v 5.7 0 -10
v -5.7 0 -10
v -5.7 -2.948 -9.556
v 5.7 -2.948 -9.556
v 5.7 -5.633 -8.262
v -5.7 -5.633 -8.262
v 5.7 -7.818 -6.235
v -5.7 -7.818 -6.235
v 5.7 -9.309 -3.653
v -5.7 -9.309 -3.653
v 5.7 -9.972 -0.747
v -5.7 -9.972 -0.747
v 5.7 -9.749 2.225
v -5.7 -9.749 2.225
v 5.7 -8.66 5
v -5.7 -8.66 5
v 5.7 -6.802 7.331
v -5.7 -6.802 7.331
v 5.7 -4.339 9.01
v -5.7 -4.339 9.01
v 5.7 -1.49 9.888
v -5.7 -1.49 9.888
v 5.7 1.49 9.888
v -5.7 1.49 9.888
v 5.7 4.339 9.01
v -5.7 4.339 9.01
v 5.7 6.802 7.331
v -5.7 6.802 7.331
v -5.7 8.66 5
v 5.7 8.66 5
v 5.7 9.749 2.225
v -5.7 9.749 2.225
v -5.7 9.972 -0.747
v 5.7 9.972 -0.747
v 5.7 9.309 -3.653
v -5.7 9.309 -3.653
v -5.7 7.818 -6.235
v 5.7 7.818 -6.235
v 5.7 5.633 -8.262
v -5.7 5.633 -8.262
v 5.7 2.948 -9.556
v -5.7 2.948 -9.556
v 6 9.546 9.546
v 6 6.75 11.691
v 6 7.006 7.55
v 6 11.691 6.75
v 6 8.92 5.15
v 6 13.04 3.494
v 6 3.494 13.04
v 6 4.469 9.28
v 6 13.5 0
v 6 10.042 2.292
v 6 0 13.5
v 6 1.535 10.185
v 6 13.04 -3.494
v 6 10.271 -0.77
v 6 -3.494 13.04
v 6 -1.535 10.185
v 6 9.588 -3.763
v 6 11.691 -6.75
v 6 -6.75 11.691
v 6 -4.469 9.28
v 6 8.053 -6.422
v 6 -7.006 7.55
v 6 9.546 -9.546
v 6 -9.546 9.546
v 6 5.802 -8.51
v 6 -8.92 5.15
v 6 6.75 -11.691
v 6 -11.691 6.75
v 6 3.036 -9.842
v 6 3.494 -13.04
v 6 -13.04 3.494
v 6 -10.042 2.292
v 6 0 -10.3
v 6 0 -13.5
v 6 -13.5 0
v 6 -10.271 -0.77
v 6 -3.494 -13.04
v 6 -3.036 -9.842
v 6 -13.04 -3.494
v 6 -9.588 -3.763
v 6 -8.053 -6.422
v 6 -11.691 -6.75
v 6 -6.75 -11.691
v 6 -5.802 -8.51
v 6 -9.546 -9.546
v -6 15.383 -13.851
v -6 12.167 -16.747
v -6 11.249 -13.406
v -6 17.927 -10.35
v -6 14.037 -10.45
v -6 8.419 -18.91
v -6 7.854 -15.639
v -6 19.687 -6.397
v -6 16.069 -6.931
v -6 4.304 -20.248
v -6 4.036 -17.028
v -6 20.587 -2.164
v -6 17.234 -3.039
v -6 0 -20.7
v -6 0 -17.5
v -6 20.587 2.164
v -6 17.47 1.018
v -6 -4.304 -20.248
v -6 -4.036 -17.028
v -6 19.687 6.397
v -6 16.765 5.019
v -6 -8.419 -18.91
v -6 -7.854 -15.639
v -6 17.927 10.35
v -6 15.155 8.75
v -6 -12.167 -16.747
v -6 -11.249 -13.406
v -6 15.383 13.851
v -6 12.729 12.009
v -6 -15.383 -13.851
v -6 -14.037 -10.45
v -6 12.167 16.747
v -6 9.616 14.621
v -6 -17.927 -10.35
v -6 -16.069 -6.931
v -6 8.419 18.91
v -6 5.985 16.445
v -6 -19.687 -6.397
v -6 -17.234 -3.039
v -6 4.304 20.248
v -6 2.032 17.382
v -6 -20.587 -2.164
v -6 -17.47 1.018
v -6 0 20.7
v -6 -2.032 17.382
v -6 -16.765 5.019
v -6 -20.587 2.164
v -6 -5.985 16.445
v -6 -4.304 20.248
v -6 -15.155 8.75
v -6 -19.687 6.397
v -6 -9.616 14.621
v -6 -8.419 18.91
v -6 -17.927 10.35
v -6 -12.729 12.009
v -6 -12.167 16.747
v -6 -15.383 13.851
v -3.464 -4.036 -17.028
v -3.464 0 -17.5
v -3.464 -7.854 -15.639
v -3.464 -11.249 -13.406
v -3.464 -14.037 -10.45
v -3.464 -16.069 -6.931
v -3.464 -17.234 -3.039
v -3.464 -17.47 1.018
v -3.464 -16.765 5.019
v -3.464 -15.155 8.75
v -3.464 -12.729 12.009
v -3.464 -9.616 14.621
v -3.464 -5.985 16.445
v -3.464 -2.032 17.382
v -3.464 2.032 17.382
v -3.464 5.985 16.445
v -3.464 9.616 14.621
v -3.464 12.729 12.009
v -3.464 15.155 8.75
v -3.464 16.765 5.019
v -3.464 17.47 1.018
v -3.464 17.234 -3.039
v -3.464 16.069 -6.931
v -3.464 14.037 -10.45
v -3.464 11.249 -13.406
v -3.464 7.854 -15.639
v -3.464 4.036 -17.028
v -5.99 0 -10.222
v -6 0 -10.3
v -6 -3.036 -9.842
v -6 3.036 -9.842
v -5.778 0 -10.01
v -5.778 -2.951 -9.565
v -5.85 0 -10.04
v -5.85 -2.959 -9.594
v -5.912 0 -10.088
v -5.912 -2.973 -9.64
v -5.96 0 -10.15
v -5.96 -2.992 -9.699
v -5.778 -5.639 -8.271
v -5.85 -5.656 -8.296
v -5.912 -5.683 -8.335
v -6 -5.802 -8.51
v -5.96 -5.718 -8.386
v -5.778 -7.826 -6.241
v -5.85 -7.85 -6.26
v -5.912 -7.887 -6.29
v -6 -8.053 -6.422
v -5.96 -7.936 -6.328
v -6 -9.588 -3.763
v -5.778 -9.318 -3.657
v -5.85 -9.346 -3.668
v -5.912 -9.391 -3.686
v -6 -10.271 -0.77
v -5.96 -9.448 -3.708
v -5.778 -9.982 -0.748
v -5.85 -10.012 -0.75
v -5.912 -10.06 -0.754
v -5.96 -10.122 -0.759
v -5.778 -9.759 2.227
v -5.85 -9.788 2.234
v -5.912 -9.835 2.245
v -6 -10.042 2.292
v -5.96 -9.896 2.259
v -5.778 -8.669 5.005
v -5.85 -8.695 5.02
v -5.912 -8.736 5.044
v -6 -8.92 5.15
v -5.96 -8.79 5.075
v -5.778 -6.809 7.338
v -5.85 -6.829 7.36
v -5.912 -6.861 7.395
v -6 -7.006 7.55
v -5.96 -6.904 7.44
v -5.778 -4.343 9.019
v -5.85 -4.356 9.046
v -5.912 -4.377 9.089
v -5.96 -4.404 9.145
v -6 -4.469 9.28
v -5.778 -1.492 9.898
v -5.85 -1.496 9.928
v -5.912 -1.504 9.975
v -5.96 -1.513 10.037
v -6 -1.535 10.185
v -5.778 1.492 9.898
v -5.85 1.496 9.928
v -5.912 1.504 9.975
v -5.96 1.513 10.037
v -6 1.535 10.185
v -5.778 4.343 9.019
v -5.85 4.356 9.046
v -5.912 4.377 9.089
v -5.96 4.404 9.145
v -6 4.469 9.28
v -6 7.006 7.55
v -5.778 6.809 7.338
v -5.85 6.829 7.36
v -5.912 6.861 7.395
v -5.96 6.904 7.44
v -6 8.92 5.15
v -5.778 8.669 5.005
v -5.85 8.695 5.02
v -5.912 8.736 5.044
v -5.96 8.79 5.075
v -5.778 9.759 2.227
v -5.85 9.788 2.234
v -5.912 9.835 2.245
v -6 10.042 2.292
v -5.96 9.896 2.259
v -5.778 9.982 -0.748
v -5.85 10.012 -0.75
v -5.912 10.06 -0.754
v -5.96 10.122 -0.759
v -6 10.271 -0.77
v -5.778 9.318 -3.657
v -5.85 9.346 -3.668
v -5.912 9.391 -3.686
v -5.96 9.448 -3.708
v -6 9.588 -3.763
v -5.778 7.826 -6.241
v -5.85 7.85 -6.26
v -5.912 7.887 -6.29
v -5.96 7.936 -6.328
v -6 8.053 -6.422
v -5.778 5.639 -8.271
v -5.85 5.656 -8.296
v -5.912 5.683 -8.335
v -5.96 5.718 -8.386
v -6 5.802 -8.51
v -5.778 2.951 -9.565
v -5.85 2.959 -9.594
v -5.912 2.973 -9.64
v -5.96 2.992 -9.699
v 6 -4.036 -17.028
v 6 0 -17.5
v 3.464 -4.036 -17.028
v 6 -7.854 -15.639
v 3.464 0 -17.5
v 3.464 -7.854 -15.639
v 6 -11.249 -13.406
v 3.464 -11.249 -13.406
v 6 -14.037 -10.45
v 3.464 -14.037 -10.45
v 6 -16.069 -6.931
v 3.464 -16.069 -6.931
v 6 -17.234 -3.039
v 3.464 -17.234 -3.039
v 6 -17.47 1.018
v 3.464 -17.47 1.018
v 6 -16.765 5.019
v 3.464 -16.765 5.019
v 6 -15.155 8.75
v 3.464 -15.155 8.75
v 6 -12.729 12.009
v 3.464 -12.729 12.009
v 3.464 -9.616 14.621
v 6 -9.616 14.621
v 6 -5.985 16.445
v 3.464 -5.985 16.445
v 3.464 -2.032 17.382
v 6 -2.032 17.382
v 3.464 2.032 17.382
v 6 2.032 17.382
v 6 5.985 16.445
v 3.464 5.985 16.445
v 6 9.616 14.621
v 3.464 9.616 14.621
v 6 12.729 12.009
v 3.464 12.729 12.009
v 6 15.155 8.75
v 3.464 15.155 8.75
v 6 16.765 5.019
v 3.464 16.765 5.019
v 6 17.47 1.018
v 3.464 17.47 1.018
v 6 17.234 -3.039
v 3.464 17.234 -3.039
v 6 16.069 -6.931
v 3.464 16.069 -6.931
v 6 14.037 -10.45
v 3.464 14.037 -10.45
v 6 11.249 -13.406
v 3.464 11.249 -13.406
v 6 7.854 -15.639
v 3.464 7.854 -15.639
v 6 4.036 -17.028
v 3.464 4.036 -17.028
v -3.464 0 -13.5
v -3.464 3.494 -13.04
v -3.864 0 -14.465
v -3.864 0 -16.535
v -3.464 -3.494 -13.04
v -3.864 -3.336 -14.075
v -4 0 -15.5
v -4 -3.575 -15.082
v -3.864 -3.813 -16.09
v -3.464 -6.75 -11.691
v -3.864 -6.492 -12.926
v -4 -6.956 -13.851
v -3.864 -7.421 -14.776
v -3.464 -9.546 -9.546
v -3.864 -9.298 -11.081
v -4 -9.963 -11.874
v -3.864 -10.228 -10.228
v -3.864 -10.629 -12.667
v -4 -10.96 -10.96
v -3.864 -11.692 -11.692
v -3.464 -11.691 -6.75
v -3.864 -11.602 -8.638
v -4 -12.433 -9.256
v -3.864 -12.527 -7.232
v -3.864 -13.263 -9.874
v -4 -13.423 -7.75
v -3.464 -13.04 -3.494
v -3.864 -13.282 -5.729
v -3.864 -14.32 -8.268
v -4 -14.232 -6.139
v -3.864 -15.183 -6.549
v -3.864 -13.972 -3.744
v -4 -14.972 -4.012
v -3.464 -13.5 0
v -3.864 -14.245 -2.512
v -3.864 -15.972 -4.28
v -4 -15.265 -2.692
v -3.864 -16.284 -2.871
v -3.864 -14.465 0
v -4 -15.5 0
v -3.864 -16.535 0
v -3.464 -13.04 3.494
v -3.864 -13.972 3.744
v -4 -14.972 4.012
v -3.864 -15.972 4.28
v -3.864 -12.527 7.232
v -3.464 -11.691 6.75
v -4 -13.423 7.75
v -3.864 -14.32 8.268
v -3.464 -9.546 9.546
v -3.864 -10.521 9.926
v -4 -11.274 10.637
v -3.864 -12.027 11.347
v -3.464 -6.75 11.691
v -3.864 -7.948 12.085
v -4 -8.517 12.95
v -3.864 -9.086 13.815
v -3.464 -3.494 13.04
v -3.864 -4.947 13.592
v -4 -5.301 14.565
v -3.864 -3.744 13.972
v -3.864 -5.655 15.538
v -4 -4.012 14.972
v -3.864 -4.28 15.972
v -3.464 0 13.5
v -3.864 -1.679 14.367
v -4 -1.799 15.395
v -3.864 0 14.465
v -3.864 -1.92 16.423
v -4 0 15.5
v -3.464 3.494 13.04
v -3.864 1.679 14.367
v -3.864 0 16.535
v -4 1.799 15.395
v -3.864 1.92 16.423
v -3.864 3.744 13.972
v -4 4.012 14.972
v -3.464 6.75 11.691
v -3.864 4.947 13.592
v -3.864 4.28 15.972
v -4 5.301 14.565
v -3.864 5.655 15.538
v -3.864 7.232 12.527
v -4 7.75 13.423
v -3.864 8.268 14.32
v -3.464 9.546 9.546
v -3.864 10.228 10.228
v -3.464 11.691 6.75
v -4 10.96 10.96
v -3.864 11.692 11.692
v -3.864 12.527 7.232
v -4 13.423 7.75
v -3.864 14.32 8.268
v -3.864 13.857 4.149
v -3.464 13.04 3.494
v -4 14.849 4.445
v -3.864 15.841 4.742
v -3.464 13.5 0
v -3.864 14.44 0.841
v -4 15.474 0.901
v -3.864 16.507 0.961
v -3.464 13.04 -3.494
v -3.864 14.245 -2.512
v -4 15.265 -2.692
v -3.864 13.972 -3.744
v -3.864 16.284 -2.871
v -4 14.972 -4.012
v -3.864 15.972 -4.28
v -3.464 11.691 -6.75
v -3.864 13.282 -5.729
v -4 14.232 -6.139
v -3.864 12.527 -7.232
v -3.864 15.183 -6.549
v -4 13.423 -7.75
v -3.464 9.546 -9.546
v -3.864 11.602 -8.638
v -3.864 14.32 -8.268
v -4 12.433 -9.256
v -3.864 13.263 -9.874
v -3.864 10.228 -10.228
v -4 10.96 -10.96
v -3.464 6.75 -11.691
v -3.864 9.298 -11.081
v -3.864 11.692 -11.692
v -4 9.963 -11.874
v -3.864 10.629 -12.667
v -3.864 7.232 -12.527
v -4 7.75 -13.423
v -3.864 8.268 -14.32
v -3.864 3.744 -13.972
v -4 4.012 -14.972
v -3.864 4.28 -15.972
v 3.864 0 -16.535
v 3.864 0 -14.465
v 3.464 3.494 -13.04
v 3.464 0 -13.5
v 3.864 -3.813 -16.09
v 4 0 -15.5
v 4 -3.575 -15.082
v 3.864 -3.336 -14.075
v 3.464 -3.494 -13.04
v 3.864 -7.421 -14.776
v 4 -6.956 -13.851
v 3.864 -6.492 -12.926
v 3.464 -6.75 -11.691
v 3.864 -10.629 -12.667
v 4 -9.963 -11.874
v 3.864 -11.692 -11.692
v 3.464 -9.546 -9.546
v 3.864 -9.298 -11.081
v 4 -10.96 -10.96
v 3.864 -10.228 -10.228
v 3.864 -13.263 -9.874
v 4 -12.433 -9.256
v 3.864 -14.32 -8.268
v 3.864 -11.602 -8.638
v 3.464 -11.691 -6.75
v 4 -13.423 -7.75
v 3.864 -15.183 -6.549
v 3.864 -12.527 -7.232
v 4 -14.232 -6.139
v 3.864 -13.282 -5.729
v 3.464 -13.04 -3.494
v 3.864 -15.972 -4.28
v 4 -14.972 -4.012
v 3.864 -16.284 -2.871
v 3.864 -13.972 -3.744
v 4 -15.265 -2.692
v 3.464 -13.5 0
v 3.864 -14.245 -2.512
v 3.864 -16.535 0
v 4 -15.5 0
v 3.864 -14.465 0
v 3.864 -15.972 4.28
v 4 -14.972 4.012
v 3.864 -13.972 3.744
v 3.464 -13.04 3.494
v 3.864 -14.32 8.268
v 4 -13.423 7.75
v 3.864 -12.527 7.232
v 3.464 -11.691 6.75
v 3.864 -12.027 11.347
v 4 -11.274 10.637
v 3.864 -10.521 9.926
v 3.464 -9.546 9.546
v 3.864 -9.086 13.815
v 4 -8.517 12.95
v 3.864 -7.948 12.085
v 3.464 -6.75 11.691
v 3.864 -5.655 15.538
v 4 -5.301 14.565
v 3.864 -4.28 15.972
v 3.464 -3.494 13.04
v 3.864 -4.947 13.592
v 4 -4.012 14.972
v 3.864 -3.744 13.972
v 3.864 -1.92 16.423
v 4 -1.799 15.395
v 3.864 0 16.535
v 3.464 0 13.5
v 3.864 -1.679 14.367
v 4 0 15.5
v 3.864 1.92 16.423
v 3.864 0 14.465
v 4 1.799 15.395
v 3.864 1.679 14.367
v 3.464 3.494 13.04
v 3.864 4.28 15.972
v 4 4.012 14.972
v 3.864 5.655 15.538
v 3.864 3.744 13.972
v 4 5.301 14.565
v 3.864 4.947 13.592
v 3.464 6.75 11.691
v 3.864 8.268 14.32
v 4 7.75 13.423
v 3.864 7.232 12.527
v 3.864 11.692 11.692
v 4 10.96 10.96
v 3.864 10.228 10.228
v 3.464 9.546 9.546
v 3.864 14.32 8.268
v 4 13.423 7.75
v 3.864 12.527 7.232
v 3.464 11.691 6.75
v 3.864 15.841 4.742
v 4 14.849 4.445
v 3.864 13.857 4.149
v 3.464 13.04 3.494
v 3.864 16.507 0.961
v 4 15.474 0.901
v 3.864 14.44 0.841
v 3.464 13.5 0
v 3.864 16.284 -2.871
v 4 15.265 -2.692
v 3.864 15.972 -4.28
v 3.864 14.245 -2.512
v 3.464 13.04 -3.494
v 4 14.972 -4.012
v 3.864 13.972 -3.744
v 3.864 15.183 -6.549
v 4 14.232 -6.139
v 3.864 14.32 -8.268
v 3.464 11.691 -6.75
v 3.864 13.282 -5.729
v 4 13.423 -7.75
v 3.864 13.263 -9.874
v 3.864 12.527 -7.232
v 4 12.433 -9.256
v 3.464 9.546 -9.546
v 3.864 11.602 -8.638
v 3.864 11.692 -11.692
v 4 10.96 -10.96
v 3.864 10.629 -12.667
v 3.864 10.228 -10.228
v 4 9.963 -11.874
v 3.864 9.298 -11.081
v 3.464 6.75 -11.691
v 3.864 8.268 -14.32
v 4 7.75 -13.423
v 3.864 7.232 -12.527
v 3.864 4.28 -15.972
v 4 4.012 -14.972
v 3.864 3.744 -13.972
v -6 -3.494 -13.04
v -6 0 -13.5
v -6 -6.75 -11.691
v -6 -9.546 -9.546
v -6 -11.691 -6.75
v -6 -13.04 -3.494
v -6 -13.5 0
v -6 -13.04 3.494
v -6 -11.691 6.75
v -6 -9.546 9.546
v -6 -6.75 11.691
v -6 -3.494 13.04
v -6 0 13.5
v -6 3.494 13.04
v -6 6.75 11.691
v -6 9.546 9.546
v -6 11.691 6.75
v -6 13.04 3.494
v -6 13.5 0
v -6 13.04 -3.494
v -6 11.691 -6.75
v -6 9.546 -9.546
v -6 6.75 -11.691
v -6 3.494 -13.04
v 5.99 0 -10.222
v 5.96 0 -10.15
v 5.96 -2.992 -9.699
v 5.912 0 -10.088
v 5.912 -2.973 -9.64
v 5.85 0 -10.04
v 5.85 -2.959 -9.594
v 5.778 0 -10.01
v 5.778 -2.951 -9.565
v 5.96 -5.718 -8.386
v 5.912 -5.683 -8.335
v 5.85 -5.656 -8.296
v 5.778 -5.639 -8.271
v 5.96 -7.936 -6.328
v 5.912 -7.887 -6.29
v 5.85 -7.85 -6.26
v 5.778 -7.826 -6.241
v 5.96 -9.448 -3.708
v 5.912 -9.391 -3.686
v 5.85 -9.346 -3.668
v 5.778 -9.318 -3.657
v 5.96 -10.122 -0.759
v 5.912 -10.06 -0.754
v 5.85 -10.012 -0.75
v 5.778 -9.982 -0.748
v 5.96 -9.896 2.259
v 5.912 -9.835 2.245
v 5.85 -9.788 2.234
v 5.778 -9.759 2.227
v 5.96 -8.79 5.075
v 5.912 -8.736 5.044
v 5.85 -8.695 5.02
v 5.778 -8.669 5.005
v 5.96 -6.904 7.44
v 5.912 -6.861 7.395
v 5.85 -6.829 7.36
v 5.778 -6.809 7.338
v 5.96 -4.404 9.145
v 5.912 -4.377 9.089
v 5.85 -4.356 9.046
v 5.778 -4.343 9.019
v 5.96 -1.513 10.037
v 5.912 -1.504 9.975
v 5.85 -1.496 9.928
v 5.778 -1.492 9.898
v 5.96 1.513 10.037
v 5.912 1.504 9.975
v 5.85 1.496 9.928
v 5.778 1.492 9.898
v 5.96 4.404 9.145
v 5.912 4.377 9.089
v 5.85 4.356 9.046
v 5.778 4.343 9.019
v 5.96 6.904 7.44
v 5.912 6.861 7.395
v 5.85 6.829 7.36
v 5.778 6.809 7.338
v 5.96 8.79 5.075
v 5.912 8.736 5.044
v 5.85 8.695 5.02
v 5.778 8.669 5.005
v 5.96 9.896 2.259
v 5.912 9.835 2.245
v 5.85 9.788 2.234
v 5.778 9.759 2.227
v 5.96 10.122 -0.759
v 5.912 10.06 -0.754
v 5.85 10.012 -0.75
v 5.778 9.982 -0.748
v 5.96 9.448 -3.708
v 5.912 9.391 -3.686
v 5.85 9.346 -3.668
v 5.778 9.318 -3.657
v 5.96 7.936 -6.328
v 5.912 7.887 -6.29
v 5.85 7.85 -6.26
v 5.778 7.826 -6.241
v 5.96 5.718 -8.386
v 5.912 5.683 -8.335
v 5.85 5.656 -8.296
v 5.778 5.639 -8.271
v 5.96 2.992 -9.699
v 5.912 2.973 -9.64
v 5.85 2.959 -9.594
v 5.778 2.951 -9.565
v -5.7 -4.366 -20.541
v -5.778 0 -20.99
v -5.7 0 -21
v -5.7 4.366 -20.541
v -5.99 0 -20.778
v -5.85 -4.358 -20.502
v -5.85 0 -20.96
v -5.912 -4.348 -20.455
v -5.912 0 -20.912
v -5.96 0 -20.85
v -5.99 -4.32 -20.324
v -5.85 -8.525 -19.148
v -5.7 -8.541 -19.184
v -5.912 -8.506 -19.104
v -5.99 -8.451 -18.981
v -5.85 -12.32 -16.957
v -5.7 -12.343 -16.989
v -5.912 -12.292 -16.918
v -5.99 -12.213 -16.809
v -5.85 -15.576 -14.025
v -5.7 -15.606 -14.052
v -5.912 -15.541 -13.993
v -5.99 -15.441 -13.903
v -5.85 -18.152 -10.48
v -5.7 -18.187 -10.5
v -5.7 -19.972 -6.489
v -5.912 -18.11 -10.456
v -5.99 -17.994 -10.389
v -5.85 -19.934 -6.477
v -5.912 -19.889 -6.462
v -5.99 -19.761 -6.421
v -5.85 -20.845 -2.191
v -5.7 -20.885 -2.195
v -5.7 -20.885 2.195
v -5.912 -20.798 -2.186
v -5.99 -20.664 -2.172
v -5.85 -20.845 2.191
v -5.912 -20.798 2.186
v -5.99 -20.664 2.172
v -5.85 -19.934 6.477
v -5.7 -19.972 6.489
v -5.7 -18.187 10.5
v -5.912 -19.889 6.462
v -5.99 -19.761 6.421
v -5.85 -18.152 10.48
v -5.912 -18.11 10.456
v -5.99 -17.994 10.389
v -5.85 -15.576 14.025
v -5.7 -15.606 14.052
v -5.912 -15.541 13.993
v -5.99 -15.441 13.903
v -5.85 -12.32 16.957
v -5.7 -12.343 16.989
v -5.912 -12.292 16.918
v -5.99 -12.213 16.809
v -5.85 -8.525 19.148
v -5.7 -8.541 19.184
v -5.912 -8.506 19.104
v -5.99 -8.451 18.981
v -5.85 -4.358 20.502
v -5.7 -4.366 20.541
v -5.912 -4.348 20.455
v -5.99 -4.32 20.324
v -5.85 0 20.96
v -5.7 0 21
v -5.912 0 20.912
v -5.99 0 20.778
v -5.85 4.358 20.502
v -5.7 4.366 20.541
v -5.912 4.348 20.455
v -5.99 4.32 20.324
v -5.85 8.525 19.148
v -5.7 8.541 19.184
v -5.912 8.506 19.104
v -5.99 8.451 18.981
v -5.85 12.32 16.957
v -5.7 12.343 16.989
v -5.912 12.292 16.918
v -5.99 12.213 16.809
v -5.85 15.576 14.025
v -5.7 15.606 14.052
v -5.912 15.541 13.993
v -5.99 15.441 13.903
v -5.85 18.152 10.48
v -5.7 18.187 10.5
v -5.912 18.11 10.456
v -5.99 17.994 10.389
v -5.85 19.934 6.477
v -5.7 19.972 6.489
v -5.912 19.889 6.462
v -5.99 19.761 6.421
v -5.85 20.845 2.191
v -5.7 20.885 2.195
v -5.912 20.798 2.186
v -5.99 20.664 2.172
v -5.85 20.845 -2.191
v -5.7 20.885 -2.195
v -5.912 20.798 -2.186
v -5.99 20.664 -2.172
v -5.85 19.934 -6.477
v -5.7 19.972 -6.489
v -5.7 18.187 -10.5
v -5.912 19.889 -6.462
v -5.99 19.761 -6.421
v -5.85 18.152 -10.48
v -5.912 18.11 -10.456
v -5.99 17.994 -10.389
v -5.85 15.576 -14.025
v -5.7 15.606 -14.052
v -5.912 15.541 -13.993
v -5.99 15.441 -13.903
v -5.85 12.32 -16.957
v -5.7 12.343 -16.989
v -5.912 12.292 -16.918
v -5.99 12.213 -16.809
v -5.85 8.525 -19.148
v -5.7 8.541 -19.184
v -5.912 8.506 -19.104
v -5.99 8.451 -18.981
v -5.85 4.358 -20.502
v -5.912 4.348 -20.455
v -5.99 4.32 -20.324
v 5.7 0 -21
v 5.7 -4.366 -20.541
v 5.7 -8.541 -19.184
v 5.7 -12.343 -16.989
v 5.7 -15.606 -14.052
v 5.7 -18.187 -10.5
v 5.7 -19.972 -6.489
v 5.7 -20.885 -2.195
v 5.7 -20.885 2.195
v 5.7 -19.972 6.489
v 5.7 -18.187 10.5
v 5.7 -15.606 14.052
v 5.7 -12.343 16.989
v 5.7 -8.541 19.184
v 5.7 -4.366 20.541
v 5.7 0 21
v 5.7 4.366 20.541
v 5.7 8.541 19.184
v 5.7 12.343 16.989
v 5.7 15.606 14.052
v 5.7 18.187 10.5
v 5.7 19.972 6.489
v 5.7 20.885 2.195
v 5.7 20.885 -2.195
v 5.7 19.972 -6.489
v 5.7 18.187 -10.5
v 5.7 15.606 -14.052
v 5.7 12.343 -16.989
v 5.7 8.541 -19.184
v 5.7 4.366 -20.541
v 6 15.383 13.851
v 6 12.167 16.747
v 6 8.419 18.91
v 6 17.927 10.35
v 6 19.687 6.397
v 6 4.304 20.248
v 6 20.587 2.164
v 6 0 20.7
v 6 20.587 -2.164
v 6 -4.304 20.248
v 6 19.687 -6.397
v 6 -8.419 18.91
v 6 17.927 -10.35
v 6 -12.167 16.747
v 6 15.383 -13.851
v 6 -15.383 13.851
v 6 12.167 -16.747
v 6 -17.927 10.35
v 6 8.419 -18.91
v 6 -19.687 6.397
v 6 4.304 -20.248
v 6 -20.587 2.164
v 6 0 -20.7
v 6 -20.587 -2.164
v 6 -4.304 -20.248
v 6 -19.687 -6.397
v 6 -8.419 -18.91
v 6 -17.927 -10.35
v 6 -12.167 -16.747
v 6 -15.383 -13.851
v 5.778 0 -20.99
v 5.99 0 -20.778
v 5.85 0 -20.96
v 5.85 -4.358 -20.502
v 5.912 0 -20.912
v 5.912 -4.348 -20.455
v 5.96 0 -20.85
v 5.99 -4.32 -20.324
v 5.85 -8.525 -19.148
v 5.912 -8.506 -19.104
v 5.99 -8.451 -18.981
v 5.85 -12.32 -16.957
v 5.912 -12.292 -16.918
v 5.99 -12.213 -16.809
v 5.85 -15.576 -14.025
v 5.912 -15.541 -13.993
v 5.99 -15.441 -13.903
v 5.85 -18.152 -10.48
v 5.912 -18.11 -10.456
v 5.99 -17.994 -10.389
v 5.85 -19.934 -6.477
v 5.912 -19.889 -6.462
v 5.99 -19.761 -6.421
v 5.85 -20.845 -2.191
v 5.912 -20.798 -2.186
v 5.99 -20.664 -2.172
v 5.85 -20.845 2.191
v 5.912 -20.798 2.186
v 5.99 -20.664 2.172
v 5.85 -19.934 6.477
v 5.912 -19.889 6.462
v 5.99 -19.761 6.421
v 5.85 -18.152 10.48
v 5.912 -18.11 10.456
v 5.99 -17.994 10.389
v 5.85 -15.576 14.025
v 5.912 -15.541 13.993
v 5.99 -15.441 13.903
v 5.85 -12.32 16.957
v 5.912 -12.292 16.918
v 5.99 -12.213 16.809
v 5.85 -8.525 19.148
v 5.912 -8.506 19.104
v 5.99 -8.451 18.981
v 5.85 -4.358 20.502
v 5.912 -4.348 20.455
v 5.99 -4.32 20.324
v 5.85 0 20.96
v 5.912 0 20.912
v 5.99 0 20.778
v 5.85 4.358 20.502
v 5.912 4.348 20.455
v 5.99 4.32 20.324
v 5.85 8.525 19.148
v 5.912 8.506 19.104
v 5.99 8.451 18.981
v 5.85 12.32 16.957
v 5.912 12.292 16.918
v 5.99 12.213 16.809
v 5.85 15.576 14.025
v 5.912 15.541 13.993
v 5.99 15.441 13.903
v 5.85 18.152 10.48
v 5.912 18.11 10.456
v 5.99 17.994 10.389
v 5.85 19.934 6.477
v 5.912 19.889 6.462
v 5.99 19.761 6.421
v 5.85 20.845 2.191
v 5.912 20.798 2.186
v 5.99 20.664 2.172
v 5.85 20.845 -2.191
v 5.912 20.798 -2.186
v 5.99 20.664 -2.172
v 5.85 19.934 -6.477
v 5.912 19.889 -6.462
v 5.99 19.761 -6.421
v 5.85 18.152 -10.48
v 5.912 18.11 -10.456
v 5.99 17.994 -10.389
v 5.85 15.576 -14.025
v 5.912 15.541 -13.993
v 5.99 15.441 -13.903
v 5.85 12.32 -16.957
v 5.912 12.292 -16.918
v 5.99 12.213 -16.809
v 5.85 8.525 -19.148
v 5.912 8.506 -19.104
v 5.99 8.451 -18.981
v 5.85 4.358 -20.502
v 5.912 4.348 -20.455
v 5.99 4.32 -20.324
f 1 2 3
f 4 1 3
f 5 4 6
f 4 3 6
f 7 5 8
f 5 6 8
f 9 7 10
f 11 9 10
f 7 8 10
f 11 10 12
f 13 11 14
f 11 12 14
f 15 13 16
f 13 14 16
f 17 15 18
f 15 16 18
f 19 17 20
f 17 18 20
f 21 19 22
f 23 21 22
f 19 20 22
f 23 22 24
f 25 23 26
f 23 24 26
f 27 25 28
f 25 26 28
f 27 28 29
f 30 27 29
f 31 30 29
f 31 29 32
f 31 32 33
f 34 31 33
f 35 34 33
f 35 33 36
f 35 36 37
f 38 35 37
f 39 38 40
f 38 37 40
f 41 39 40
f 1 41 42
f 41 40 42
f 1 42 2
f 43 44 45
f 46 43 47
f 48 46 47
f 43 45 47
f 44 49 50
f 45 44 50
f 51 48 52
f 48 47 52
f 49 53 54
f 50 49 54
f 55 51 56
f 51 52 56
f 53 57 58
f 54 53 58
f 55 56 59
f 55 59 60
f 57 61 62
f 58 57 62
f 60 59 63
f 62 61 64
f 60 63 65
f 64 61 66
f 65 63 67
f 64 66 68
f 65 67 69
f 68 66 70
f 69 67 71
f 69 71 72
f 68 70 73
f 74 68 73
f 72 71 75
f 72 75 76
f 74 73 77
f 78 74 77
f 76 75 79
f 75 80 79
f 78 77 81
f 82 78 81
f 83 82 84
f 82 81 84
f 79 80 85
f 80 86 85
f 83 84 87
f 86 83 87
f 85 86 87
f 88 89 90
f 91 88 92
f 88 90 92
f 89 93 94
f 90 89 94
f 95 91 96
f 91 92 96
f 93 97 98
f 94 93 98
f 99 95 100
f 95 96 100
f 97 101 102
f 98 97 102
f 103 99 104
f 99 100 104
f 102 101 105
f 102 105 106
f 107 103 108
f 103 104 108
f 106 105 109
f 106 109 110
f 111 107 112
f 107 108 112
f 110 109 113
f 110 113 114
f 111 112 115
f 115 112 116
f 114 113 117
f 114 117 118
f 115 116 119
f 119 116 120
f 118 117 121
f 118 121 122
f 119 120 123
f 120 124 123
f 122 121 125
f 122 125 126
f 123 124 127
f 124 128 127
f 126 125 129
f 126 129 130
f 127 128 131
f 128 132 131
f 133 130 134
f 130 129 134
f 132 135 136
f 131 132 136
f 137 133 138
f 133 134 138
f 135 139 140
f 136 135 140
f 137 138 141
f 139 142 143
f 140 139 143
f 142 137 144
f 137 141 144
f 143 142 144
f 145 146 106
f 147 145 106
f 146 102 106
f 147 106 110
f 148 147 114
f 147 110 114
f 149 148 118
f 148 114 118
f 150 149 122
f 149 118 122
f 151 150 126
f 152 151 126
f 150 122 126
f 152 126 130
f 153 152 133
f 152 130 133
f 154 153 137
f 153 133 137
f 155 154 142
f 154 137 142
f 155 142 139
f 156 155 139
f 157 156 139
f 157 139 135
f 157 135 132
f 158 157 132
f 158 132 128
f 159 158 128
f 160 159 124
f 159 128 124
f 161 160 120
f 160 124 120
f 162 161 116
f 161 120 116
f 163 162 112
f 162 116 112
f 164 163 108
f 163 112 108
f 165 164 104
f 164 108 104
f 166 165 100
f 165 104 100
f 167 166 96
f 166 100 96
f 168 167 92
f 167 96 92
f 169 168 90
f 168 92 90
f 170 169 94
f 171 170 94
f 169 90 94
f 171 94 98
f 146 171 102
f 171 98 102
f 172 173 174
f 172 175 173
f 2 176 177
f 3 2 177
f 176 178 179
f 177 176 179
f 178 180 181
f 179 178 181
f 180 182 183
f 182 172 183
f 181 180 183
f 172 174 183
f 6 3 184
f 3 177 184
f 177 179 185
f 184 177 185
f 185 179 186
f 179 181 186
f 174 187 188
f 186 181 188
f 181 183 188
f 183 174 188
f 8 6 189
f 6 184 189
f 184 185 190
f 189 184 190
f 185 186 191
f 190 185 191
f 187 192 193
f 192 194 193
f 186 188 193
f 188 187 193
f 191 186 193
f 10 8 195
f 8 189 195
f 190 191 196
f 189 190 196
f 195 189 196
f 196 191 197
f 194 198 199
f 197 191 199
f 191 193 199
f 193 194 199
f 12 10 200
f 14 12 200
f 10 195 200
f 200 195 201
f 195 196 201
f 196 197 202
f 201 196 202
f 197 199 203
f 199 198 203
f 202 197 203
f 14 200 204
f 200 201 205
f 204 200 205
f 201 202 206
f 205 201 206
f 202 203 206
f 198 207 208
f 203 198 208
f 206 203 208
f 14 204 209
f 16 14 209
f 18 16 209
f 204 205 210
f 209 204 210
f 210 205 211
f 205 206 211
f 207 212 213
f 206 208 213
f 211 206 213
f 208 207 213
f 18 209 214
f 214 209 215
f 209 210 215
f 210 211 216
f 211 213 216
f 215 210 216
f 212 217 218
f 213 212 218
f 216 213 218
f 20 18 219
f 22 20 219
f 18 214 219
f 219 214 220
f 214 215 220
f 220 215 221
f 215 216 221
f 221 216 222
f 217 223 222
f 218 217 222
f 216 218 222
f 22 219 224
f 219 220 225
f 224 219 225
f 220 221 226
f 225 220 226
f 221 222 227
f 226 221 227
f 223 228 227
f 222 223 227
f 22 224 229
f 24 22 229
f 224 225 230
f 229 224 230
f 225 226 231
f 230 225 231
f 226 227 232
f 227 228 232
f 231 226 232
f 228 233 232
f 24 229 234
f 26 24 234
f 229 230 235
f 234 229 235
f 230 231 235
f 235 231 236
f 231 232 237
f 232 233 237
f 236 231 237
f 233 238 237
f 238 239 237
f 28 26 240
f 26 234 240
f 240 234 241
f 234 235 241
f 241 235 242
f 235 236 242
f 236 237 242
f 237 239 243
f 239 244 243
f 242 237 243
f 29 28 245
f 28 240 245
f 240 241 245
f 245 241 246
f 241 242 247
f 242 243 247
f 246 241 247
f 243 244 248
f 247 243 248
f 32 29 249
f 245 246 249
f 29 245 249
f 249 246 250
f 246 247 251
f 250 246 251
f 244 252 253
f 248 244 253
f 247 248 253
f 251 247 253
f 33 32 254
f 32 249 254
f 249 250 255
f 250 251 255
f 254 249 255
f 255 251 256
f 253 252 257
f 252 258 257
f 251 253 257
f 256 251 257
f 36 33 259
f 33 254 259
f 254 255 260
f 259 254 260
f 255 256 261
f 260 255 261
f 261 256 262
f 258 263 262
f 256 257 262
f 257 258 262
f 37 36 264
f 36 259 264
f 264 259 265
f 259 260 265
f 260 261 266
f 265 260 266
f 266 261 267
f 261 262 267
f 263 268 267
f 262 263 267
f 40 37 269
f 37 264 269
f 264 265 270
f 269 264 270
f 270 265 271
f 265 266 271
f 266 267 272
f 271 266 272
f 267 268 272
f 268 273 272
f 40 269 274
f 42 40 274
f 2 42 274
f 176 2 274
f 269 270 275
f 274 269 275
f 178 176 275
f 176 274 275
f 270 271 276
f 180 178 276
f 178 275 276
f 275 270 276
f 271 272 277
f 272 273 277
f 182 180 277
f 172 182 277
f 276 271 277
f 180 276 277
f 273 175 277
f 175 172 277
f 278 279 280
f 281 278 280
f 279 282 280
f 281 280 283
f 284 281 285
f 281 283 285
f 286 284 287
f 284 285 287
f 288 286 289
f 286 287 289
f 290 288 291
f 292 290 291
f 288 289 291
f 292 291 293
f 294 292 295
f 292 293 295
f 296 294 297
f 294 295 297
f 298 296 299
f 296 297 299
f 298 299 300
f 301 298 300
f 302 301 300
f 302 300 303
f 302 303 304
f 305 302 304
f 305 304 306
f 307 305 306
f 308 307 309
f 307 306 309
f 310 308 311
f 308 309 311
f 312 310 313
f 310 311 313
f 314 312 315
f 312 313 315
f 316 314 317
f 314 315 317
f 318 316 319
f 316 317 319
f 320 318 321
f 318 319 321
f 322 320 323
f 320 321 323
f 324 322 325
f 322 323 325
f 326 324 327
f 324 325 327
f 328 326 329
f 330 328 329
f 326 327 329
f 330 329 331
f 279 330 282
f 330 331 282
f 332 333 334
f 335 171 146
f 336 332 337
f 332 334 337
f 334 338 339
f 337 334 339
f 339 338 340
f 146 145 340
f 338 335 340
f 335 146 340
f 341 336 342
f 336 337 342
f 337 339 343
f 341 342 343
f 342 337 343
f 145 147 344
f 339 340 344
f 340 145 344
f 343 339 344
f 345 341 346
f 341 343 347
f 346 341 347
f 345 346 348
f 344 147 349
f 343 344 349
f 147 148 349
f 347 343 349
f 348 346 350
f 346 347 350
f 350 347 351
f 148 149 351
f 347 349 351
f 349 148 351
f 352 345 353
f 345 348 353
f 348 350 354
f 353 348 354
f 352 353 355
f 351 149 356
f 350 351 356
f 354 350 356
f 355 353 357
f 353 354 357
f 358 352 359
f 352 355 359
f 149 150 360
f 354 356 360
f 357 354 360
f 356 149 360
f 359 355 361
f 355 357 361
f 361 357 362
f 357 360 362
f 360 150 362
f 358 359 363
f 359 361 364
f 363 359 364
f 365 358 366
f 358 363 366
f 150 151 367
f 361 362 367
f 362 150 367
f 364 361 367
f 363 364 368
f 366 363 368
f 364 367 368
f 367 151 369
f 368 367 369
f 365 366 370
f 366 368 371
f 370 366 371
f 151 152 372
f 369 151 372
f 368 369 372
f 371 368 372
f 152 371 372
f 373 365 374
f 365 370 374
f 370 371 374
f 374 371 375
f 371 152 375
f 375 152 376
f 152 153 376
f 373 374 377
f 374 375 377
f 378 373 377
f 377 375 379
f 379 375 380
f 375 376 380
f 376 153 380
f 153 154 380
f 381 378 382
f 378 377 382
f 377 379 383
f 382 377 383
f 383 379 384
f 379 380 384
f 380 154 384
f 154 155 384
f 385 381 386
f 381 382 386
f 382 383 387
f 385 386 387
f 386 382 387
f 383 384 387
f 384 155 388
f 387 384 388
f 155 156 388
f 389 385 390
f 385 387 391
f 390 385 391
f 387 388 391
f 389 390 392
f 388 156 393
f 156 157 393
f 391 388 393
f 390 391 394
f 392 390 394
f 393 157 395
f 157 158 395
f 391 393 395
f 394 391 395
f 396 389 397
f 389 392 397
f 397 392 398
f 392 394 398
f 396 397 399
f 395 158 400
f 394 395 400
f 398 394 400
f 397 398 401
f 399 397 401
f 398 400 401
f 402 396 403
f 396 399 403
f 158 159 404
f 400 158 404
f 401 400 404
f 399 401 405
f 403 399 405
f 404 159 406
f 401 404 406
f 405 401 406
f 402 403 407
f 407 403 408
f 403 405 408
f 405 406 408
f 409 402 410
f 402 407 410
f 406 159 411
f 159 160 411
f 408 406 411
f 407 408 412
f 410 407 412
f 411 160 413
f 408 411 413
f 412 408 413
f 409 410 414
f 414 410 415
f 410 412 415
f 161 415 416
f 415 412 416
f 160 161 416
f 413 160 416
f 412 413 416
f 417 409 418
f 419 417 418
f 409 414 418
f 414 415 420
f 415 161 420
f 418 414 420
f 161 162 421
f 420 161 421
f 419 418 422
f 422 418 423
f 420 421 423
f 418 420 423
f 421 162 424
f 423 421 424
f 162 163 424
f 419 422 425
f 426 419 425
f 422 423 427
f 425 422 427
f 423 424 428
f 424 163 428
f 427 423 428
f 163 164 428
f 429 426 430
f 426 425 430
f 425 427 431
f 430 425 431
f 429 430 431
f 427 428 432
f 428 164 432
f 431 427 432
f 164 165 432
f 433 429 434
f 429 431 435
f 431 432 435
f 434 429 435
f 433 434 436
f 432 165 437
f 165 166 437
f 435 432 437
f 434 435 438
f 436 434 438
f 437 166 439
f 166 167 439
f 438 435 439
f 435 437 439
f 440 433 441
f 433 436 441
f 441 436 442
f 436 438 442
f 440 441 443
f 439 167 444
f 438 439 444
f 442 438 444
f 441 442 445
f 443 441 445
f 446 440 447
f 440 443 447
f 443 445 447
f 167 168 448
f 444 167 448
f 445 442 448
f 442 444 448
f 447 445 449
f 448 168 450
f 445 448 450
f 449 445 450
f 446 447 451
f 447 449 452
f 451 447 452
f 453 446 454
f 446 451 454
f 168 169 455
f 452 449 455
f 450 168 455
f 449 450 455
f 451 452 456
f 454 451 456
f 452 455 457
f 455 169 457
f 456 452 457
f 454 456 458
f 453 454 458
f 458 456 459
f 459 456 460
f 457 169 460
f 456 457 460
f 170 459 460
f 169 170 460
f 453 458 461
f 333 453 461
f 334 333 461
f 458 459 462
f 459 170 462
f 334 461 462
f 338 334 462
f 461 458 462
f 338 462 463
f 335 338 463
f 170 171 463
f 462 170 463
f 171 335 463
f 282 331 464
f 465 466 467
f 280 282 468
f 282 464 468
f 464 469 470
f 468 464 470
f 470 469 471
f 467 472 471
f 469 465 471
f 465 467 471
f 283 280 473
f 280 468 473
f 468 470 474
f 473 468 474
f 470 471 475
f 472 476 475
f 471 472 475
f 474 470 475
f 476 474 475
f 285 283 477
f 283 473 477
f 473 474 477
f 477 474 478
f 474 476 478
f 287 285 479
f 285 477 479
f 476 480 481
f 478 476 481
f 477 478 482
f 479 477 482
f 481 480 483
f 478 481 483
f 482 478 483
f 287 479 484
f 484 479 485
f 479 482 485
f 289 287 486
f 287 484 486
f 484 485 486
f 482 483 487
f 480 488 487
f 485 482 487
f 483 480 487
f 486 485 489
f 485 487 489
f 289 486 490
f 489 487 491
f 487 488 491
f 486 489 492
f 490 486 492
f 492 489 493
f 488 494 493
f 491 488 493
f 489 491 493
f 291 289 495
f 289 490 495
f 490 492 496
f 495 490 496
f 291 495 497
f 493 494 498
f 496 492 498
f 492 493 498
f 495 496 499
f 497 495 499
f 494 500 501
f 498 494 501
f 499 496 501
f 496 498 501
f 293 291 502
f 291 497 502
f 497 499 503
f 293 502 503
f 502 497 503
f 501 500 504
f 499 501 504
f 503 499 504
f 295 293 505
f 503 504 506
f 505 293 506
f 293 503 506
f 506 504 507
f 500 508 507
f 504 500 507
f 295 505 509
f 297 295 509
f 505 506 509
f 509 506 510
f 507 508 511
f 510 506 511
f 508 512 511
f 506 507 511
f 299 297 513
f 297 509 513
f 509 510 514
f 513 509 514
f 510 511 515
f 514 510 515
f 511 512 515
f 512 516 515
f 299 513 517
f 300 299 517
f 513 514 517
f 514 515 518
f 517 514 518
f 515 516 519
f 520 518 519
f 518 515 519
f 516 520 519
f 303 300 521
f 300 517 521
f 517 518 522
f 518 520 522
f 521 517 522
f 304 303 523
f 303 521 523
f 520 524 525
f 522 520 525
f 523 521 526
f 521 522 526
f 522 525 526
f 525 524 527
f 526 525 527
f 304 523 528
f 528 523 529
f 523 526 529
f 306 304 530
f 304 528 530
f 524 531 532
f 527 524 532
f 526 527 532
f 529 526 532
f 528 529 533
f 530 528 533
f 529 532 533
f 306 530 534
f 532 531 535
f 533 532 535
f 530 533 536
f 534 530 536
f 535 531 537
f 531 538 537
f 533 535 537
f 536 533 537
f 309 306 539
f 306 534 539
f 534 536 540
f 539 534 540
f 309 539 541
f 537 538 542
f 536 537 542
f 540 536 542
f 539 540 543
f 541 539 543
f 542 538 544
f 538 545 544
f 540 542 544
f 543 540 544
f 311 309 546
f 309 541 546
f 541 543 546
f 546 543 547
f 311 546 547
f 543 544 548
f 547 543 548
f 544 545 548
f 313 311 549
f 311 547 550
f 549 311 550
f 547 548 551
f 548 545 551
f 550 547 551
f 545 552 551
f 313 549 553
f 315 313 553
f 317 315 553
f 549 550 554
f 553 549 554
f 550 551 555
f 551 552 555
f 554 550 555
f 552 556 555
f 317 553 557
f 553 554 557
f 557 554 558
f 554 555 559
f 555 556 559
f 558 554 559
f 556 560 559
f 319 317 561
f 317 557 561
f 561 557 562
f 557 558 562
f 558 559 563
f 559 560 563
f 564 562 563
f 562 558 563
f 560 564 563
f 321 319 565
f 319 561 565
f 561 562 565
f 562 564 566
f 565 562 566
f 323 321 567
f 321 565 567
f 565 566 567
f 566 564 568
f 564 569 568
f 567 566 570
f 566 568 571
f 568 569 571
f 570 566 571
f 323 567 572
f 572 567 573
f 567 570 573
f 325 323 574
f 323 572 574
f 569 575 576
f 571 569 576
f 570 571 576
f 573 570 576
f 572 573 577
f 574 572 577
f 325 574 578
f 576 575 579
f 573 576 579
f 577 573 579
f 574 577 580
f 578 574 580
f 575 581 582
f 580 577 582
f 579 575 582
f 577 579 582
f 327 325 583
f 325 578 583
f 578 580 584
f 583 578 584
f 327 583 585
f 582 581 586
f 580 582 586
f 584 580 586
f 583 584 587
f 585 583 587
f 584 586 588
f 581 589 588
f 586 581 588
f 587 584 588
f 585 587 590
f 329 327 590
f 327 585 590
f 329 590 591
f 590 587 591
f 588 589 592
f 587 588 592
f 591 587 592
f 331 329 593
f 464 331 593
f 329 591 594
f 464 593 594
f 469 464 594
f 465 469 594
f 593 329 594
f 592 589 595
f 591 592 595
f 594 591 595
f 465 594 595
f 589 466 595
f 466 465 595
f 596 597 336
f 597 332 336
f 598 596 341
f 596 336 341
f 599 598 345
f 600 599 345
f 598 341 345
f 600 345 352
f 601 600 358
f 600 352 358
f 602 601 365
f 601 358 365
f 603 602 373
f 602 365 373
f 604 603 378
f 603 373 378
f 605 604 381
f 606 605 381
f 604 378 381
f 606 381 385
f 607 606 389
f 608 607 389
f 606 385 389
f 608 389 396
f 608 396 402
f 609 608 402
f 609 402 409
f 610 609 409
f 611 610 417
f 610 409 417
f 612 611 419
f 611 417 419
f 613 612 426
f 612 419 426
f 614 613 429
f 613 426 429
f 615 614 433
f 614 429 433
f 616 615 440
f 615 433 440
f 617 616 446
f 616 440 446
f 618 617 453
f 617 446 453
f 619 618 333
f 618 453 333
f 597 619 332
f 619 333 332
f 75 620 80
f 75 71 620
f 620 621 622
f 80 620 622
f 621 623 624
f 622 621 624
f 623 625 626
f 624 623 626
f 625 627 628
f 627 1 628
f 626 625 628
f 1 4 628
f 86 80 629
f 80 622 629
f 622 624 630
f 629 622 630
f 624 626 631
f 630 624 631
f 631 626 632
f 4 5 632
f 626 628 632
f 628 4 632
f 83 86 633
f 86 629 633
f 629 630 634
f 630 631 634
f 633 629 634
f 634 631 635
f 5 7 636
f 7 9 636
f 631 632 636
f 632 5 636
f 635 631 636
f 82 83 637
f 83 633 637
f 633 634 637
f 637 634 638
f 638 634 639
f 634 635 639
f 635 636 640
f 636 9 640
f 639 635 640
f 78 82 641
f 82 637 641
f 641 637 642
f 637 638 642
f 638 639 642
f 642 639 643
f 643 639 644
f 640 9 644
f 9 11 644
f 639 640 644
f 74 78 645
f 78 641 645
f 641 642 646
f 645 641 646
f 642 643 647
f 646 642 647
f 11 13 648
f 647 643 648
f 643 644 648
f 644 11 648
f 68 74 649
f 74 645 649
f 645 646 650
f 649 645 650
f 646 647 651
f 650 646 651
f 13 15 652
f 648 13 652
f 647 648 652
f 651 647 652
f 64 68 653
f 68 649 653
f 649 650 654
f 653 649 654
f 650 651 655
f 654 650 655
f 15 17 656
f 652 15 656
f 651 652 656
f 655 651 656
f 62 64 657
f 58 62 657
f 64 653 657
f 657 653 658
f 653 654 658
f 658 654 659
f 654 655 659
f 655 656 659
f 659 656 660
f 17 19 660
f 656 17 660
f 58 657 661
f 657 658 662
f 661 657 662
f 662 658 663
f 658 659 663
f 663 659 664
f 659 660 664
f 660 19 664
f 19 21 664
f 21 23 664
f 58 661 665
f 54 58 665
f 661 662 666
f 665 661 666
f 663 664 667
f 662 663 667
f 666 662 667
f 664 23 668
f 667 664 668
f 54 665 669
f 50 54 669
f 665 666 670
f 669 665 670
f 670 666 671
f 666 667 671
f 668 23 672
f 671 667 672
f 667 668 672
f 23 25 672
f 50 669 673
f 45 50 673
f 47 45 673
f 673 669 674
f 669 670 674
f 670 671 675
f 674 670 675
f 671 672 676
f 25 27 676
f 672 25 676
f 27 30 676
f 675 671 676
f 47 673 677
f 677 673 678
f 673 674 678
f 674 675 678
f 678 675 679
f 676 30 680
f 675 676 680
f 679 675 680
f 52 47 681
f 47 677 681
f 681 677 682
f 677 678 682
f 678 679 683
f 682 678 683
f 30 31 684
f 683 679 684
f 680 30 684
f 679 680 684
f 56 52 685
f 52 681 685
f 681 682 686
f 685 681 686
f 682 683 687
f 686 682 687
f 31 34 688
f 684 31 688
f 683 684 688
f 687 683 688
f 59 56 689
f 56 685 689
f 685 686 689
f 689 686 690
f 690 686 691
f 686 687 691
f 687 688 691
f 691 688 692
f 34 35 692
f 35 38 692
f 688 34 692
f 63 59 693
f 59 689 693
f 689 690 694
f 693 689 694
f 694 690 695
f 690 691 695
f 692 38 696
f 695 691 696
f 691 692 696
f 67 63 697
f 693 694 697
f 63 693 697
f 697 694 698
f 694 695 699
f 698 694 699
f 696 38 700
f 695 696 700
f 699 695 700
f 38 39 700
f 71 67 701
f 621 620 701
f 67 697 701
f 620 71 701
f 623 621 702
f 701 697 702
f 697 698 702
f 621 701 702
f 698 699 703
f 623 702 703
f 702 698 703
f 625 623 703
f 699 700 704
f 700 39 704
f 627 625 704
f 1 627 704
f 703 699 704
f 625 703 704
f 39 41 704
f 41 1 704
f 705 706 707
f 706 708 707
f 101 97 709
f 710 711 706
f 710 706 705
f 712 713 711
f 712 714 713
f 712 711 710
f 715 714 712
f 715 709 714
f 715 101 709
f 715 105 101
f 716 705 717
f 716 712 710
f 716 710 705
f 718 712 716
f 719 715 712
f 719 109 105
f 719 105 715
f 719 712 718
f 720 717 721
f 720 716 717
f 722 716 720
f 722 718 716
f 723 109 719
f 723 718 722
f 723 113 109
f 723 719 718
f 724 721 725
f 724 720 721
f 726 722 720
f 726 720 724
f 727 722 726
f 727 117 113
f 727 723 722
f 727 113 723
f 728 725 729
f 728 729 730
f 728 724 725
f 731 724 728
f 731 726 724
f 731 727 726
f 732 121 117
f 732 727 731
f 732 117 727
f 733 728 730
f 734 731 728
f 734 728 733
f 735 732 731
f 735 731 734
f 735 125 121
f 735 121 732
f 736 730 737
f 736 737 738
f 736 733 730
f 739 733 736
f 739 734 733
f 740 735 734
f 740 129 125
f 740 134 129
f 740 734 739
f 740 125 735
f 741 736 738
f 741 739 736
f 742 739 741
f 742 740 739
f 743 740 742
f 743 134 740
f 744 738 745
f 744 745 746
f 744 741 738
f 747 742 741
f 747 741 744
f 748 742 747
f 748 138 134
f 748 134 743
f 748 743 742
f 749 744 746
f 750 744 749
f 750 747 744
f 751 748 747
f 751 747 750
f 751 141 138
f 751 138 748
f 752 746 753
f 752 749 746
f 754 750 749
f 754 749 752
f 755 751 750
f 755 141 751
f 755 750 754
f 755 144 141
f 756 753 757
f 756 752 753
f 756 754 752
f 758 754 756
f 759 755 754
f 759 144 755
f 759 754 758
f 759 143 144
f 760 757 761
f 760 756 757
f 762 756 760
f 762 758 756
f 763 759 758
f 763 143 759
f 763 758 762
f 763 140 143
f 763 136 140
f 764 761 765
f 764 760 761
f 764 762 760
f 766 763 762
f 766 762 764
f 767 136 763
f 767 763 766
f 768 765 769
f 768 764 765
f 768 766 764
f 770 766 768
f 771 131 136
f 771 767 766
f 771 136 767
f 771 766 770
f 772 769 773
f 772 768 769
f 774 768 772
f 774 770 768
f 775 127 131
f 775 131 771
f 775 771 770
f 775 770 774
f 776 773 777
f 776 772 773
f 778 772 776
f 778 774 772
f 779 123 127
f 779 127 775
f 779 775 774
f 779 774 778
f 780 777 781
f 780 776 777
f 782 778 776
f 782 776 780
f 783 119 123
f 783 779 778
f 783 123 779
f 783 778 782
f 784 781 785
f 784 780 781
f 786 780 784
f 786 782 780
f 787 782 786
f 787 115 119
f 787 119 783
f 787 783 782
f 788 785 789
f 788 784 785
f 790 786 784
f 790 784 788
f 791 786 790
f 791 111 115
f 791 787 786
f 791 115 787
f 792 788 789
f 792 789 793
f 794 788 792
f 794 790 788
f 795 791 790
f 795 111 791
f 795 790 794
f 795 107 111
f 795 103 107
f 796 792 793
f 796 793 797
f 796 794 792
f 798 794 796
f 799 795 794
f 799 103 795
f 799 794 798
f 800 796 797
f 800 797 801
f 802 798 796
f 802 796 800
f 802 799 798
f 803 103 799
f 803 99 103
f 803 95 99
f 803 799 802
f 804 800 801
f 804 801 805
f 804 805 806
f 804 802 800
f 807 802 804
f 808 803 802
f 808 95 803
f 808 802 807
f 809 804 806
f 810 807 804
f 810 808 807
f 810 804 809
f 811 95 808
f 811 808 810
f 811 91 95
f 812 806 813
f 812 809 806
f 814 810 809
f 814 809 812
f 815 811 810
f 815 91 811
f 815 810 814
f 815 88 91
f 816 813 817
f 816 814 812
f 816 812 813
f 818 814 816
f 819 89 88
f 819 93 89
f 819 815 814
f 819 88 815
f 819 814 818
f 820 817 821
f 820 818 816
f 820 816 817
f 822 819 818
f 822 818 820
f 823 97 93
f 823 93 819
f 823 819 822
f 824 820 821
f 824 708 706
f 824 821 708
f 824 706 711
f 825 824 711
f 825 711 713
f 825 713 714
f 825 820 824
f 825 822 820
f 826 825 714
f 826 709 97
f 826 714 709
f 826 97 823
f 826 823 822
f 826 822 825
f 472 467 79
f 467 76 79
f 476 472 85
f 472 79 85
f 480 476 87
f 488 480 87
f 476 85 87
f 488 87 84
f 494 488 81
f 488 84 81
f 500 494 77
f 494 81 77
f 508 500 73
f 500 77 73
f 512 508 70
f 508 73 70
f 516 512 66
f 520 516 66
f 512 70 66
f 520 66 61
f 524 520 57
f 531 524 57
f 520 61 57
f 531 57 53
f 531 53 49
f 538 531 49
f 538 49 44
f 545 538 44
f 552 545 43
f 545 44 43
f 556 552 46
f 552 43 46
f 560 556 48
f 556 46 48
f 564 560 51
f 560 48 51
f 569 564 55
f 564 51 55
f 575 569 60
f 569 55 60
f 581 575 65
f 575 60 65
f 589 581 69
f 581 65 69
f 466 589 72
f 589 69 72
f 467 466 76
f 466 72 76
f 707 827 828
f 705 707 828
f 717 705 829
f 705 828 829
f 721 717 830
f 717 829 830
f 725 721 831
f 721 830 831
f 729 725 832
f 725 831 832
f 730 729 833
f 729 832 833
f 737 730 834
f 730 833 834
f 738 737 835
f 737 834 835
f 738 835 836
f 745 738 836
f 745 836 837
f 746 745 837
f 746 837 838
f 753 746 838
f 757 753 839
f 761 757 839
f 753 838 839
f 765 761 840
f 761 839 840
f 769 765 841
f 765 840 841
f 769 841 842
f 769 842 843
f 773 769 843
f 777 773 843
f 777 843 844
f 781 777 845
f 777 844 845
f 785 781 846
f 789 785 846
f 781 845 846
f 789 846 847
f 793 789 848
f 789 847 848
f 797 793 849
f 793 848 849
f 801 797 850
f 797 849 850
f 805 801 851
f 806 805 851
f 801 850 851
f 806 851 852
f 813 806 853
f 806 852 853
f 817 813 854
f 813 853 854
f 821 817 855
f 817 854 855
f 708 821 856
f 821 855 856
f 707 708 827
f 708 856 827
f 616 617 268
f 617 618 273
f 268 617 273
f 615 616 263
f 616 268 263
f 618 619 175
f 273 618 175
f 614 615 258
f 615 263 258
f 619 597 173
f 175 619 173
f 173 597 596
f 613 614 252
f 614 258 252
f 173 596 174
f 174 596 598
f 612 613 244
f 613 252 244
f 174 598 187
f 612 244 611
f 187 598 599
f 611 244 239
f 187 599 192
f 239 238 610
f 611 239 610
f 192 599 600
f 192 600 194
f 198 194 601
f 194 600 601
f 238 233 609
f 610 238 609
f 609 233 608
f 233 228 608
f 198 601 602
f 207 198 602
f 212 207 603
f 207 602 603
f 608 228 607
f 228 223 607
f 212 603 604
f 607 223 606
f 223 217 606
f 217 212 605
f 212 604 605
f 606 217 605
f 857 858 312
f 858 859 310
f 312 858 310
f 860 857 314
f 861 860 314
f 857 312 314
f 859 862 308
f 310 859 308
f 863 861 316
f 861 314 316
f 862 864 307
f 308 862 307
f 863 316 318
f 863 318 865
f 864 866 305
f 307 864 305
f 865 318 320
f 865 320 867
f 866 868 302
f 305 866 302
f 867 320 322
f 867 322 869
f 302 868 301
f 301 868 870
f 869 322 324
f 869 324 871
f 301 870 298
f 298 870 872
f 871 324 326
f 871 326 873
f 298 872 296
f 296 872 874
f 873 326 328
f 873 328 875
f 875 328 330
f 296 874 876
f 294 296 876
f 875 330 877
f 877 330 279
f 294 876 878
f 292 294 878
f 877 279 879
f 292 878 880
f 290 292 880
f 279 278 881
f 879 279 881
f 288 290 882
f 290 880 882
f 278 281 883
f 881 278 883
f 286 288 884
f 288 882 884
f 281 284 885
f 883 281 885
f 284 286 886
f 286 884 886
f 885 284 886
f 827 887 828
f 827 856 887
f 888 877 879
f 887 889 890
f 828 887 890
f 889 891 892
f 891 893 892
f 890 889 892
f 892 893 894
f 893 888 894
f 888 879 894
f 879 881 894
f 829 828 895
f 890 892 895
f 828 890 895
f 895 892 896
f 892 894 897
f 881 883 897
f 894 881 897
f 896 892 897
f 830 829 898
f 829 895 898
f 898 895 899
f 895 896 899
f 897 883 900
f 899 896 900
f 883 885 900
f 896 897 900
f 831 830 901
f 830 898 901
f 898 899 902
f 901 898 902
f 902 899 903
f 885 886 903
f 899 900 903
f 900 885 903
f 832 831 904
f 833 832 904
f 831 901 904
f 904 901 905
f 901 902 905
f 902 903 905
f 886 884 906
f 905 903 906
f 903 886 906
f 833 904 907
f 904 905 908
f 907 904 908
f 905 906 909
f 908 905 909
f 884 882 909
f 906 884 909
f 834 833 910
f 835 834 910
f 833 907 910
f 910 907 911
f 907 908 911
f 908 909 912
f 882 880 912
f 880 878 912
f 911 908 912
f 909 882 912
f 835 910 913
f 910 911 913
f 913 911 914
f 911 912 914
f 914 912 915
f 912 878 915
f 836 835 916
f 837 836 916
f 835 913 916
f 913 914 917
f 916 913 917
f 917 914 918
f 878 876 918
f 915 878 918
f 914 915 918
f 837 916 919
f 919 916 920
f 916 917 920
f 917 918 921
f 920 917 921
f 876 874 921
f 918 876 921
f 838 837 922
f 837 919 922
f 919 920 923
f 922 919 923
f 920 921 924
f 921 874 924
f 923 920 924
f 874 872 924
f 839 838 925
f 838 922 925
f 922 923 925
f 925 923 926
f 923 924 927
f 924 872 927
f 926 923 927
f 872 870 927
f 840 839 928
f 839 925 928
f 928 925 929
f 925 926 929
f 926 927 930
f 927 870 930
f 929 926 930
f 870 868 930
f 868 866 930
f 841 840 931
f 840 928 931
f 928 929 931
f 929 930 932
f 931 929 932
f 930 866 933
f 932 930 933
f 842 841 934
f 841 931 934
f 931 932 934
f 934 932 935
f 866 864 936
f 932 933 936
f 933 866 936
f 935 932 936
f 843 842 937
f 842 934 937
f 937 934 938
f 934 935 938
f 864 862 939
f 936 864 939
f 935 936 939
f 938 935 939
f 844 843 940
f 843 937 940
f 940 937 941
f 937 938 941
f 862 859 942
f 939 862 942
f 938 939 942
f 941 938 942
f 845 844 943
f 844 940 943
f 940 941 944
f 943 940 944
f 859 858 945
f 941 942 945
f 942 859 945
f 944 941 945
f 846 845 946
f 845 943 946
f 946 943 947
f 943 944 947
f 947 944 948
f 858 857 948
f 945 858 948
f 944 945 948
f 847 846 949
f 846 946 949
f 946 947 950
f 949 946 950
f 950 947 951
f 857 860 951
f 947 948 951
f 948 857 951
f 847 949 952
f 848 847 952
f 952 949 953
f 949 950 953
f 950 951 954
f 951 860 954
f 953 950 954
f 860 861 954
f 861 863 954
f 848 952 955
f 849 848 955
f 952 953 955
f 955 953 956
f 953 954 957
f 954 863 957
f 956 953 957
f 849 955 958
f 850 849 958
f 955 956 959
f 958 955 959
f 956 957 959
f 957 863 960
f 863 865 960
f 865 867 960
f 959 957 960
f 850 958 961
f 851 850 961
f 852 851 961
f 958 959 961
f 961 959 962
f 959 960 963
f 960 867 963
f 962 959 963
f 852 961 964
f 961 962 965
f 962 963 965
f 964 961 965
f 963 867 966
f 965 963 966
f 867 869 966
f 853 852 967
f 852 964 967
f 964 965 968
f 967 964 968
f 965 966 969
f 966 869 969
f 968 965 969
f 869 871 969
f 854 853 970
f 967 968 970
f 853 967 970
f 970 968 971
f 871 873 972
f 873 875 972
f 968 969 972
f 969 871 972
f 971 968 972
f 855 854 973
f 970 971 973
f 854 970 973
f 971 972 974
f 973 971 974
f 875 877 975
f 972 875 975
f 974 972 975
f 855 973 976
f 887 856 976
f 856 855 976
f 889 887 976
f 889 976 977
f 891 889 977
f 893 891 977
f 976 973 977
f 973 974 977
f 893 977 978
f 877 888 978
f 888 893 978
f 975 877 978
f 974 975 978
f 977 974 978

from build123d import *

# Parameters (mm, degrees)
FILLET1_R = 0.3


with BuildPart() as part:
    # Sketch1 → Revolve1 (revolve)
    with BuildSketch(Plane.XY):
        with BuildLine():
            Line((-6, 21), (6, 21))
            Line((6, 21), (6, 17.5))
            Line((6, 17.5), (3.464101615, 17.5))
            ThreePointArc((3.464101615, 17.5), (4, 15.5), (3.464101615, 13.5))
            Line((3.464101615, 13.5), (6, 13.5))
            Line((6, 13.5), (6, 10))
            Line((6, 10), (-6, 10))
            Line((-6, 10), (-6, 13.5))
            Line((-6, 13.5), (-3.464101615, 13.5))
            ThreePointArc((-3.464101615, 13.5), (-4, 15.5), (-3.464101615, 17.5))
            Line((-3.464101615, 17.5), (-6, 17.5))
            Line((-6, 17.5), (-6, 21))
        make_face()
    revolve(axis=Axis((60.829082801, 0, 0), (-1, 0, 0)))

    # Fillet1
    fillet1_edges = [part.edges().sort_by_distance(p)[0] for p in [
        (-6, -10, 0),
        (6, -10, 0),
        (6, -21, 0),
        (-6, -21, 0),
    ]]
    fillet(fillet1_edges, radius=FILLET1_R)


solid = part.part
